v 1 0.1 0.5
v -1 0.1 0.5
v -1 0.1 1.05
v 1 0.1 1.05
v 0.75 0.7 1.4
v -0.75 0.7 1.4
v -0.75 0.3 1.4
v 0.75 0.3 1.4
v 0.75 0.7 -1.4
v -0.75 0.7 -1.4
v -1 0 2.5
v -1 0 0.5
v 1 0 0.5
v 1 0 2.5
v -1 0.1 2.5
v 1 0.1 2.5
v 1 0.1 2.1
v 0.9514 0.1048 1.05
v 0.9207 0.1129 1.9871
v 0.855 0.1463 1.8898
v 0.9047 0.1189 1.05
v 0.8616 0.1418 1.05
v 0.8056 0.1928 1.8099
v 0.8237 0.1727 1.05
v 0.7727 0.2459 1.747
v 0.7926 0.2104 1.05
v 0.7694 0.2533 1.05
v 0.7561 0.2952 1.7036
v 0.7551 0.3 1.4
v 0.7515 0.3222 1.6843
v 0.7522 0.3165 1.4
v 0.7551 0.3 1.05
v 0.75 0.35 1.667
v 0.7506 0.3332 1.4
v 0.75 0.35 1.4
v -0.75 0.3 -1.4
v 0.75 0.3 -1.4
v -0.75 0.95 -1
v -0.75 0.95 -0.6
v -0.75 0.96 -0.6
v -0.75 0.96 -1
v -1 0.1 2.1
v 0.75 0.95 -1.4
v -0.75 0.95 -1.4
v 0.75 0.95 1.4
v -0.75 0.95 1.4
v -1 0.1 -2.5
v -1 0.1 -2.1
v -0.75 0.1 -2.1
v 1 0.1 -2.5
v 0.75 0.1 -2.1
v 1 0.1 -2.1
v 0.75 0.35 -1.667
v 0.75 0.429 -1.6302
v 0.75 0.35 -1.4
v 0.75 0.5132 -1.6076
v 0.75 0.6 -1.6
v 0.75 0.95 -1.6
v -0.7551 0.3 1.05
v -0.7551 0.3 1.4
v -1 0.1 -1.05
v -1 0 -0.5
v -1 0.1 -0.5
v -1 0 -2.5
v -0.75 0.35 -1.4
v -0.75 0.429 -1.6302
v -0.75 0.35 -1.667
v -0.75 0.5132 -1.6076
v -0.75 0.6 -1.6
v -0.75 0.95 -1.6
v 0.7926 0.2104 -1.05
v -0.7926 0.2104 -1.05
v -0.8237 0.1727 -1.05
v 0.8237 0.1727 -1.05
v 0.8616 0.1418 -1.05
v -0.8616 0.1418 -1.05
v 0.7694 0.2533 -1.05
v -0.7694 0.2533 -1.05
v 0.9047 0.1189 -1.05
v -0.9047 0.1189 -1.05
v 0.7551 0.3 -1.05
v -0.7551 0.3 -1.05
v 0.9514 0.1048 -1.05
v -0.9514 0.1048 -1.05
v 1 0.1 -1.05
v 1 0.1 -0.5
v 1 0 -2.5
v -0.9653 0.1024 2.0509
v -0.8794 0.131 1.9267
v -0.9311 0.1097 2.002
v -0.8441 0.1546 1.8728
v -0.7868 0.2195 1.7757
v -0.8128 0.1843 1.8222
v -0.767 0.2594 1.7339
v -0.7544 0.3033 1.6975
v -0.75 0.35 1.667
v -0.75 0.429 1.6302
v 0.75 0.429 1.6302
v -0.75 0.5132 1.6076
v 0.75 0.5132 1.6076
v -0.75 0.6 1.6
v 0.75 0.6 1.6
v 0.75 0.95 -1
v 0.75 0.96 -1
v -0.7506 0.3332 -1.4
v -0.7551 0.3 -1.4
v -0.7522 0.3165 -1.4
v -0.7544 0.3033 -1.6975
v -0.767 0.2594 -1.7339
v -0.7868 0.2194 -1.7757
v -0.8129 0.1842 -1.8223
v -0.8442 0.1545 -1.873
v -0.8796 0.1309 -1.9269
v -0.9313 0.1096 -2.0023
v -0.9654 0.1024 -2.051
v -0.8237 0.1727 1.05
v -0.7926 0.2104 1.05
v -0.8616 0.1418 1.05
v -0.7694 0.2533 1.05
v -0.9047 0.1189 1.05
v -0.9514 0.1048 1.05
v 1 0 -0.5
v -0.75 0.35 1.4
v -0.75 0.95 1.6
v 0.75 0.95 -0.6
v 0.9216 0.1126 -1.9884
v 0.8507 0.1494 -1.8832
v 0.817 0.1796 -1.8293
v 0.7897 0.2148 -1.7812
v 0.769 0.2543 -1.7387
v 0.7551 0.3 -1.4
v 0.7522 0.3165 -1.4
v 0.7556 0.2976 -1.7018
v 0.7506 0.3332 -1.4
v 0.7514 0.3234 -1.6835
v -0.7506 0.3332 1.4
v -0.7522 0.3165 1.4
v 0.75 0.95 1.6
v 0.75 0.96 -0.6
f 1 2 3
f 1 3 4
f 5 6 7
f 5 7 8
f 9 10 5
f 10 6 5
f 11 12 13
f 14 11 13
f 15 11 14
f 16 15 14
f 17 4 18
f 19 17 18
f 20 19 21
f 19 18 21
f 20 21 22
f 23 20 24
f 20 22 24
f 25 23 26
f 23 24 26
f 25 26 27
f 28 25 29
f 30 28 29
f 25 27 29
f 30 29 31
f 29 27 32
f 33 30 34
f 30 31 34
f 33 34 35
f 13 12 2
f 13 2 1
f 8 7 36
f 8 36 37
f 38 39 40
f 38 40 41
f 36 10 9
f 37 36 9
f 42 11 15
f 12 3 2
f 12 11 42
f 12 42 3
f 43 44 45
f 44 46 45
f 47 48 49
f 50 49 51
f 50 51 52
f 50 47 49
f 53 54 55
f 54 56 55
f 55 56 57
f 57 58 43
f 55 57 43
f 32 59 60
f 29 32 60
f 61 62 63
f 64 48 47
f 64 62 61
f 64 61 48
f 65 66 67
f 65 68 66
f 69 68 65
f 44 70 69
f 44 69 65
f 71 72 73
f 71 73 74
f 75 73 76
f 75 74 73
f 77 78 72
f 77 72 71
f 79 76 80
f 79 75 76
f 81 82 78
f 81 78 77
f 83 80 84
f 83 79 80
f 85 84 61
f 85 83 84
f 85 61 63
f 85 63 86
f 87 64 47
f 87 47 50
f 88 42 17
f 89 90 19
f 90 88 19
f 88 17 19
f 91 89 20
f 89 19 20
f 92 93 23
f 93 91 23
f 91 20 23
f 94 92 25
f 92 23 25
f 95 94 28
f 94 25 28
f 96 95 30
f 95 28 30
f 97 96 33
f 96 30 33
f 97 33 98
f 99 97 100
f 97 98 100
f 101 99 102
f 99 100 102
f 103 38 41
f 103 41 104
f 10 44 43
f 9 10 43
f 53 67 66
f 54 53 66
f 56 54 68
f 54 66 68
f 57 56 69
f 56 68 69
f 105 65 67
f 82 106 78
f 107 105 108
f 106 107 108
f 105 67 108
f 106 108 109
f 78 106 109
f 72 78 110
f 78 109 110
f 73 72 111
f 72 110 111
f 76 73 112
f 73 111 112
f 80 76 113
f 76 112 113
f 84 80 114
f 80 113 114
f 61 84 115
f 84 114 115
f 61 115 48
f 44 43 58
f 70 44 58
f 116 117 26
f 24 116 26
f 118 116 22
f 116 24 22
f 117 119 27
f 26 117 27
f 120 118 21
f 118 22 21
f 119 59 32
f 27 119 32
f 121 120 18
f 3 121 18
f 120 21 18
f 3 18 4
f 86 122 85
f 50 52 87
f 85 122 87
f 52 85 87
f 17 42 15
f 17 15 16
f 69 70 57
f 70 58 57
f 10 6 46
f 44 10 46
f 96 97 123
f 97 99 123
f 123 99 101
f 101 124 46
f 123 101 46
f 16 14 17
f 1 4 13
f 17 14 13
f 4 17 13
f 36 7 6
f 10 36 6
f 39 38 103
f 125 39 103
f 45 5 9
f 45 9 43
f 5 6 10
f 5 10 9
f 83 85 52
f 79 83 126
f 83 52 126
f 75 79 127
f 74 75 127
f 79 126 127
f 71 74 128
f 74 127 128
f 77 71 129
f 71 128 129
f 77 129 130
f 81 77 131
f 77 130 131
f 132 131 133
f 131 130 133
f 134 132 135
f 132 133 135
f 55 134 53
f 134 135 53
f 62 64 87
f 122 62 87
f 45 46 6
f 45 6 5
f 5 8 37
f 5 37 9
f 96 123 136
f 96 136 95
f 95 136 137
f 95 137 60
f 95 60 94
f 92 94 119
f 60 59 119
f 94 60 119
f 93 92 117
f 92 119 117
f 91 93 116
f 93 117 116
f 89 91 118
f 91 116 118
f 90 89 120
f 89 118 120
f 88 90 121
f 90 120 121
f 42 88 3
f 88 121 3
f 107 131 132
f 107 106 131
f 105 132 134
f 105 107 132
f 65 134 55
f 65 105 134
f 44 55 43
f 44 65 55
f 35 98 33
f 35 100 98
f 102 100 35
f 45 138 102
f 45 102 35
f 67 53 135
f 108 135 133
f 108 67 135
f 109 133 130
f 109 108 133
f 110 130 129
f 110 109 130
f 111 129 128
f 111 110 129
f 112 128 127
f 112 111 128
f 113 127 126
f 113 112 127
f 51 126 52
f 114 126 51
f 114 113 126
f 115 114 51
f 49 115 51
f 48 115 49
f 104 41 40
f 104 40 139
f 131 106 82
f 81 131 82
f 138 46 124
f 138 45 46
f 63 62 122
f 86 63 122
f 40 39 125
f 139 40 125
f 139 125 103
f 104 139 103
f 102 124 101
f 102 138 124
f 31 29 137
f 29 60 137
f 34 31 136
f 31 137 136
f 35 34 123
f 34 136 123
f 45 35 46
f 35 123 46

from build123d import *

# Parameters (mm, degrees)
SKETCH1_W             = 1.5
SKETCH1_H             = 0.4
BOSS_EXTRUDE1_DEPTH   = 1.4
BOSS_EXTRUDE2_DEPTH   = 0.75
BOSS_EXTRUDE2_2_DEPTH = 0.75
SKETCH5_W             = 1.5
SKETCH5_H             = 0.25
BOSS_EXTRUDE4_DEPTH   = 1.4
SKETCH4_W             = 2
SKETCH4_H             = 2
BOSS_EXTRUDE3_DEPTH   = 0.1
SKETCH6_W             = 1.5
SKETCH6_H             = 0.4
BOSS_EXTRUDE5_DEPTH   = 0.01
FILLET1_R             = 0.5
FILLET2_R             = 0.5
FILLET3_START         = -1.5999999
FILLET3_DEPTH         = 0.5499999
FILLET3_START_2       = -2.1000001
FILLET3_2_DEPTH       = 0.5000001
FILLET3_START_3       = -2
FILLET3_3_OUTLINE_W   = 0.05
FILLET3_3_OUTLINE_H   = 0.35
FILLET3_3_DEPTH       = 4
FILLET4_START         = 1.05
FILLET4_DEPTH         = 0.5499999
FILLET4_START_2       = 1.5999999
FILLET4_2_DEPTH       = 0.5000001
FILLET4_START_3       = -2
FILLET4_3_OUTLINE_W   = 0.05
FILLET4_3_OUTLINE_H   = 0.35
FILLET4_3_DEPTH       = 4


with BuildPart() as part:
    # Sketch1 → Boss-Extrude1 (new, symmetric)
    with BuildSketch(Plane.XY):
        with Locations((0, 0.5)):
            Rectangle(SKETCH1_W, SKETCH1_H)
    extrude(amount=BOSS_EXTRUDE1_DEPTH, both=True)


with BuildPart() as body_2:
    # Sketch3 → Boss-Extrude2 (new, symmetric)
    with BuildSketch(Plane(origin=(0, 0, 0), x_dir=(0, 0, -1), z_dir=(1, 0, 0))):
        Polygon((-1.4, 0.95), (-1.6, 0.95), (-1.6, 0.1), (-1.05, 0.1), (-1.05, 0.3), (-1.4, 0.3), align=None)
    extrude(amount=BOSS_EXTRUDE2_DEPTH, both=True)



with BuildPart() as body_3:
    # Sketch3 → Boss-Extrude2 2 (new, symmetric)
    with BuildSketch(Plane(origin=(0, 0, 0), x_dir=(0, 0, -1), z_dir=(1, 0, 0))):
        Polygon((1.4, 0.95), (1.6, 0.95), (1.6, 0.1), (1.05, 0.1), (1.05, 0.3), (1.4, 0.3), align=None)
    extrude(amount=BOSS_EXTRUDE2_2_DEPTH, both=True)


with BuildPart() as body_4:
    # Sketch5 → Boss-Extrude4 (new, symmetric)
    with BuildSketch(Plane.XY):
        with Locations((0, 0.825)):
            Rectangle(SKETCH5_W, SKETCH5_H)
    extrude(amount=BOSS_EXTRUDE4_DEPTH, both=True)


with BuildPart() as body_2_1:
    add(body_2.part)

    add(body_3.part)  # Boss-Extrude3 merges body 3
    # Sketch4 → Boss-Extrude3 (add)
    with BuildSketch(Plane(origin=(0, 0, 0), x_dir=(1, 0, 0), z_dir=(0, 1, 0))):
        with Locations((0, 1.5)):
            Rectangle(SKETCH4_W, SKETCH4_H)
        with Locations((0, -1.5)):
            Rectangle(SKETCH4_W, SKETCH4_H)
    extrude(amount=BOSS_EXTRUDE3_DEPTH)

    # Fillet1
    fillet1_edges = [body_2_1.edges().sort_by_distance(p)[0] for p in [
        (0, 0.1, 1.6),
    ]]
    fillet(fillet1_edges, radius=FILLET1_R)

    # Fillet2
    fillet2_edges = [body_2_1.edges().sort_by_distance(p)[0] for p in [
        (0, 0.1, -1.6),
    ]]
    fillet(fillet2_edges, radius=FILLET2_R)

    # Fillet3: read off the stored shape, not the designer's step
    # Fillet3 outline → Fillet3 (add)
    with BuildSketch(Plane.XY.offset(FILLET3_START)):
        with BuildLine():
            Line((0.75, 0.1), (1, 0.1))
            ThreePointArc((1, 0.1), (0.823223305, 0.173223305), (0.75, 0.35))
            Line((0.75, 0.35), (0.75, 0.1))
        make_face()
        with BuildLine():
            Line((-1, 0.1), (-0.75, 0.1))
            Line((-0.75, 0.1), (-0.75, 0.35))
            ThreePointArc((-0.75, 0.35), (-0.823223305, 0.173223305), (-1, 0.1))
        make_face()
    extrude(amount=FILLET3_DEPTH)

    # Fillet3 2 outline → Fillet3 2 (add)
    with BuildSketch(Plane.XY.offset(FILLET3_START_2)):
        with BuildLine():
            Line((0.75, 0.1), (1, 0.1))
            ThreePointArc((1, 0.1), (0.823223305, 0.173223305), (0.75, 0.35))
            Line((0.75, 0.35), (0.75, 0.1))
        make_face()
        with BuildLine():
            Line((-1, 0.1), (-0.75, 0.1))
            Line((-0.75, 0.1), (-0.75, 0.35))
            ThreePointArc((-0.75, 0.35), (-0.823223305, 0.173223305), (-1, 0.1))
        make_face()
    extrude(amount=FILLET3_2_DEPTH)

    # Fillet3 3 outline → Fillet3 3 (cut)
    with BuildSketch(Plane.YZ.offset(FILLET3_START_3)):
        with BuildLine():
            Line((0.1, -2.1), (0.35, -2.1000001))
            Line((0.35, -2.1000001), (0.35, -1.666987298))
            ThreePointArc((0.35, -1.666987298), (0.166987298, -1.85), (0.1, -2.1))
        make_face()
        with Locations((0.325, -1.225)):
            Rectangle(FILLET3_3_OUTLINE_W, FILLET3_3_OUTLINE_H)
    extrude(amount=FILLET3_3_DEPTH, mode=Mode.SUBTRACT)

    # Fillet4: read off the stored shape, not the designer's step
    # Fillet4 outline → Fillet4 (add)
    with BuildSketch(Plane.XY.offset(FILLET4_START)):
        with BuildLine():
            Line((-0.75, 0.1), (-0.75, 0.35))
            ThreePointArc((-0.75, 0.35), (-0.823223305, 0.173223305), (-1, 0.1))
            Line((-1, 0.1), (-0.75, 0.1))
        make_face()
        with BuildLine():
            Line((0.75, 0.35), (0.75, 0.1))
            Line((0.75, 0.1), (1, 0.1))
            ThreePointArc((1, 0.1), (0.823223305, 0.173223305), (0.75, 0.35))
        make_face()
    extrude(amount=FILLET4_DEPTH)

    # Fillet4 2 outline → Fillet4 2 (add)
    with BuildSketch(Plane.XY.offset(FILLET4_START_2)):
        with BuildLine():
            Line((-0.75, 0.1), (-0.75, 0.35))
            ThreePointArc((-0.75, 0.35), (-0.823223305, 0.173223305), (-1, 0.1))
            Line((-1, 0.1), (-0.75, 0.1))
        make_face()
        with BuildLine():
            Line((0.75, 0.35), (0.75, 0.1))
            Line((0.75, 0.1), (1, 0.1))
            ThreePointArc((1, 0.1), (0.823223305, 0.173223305), (0.75, 0.35))
        make_face()
    extrude(amount=FILLET4_2_DEPTH)

    # Fillet4 3 outline → Fillet4 3 (cut)
    with BuildSketch(Plane.YZ.offset(FILLET4_START_3)):
        with BuildLine():
            ThreePointArc((0.1, 2.1), (0.166987298, 1.85), (0.35, 1.666987298))
            Line((0.35, 1.666987298), (0.35, 2.1))
            Line((0.35, 2.1), (0.1, 2.1))
        make_face()
        with Locations((0.325, 1.225)):
            Rectangle(FILLET4_3_OUTLINE_W, FILLET4_3_OUTLINE_H)
    extrude(amount=FILLET4_3_DEPTH, mode=Mode.SUBTRACT)


with BuildPart() as body_4_2:
    # Sketch6 → Boss-Extrude5 (new body)
    with BuildSketch(Plane(origin=(0, 0.95, 0), x_dir=(1, 0, 0), z_dir=(0, 1, 0))):
        with Locations((0, 0.8)):
            Rectangle(SKETCH6_W, SKETCH6_H)
    extrude(amount=BOSS_EXTRUDE5_DEPTH)


solid = Compound([part.part, body_4.part, body_2_1.part, body_4_2.part])
